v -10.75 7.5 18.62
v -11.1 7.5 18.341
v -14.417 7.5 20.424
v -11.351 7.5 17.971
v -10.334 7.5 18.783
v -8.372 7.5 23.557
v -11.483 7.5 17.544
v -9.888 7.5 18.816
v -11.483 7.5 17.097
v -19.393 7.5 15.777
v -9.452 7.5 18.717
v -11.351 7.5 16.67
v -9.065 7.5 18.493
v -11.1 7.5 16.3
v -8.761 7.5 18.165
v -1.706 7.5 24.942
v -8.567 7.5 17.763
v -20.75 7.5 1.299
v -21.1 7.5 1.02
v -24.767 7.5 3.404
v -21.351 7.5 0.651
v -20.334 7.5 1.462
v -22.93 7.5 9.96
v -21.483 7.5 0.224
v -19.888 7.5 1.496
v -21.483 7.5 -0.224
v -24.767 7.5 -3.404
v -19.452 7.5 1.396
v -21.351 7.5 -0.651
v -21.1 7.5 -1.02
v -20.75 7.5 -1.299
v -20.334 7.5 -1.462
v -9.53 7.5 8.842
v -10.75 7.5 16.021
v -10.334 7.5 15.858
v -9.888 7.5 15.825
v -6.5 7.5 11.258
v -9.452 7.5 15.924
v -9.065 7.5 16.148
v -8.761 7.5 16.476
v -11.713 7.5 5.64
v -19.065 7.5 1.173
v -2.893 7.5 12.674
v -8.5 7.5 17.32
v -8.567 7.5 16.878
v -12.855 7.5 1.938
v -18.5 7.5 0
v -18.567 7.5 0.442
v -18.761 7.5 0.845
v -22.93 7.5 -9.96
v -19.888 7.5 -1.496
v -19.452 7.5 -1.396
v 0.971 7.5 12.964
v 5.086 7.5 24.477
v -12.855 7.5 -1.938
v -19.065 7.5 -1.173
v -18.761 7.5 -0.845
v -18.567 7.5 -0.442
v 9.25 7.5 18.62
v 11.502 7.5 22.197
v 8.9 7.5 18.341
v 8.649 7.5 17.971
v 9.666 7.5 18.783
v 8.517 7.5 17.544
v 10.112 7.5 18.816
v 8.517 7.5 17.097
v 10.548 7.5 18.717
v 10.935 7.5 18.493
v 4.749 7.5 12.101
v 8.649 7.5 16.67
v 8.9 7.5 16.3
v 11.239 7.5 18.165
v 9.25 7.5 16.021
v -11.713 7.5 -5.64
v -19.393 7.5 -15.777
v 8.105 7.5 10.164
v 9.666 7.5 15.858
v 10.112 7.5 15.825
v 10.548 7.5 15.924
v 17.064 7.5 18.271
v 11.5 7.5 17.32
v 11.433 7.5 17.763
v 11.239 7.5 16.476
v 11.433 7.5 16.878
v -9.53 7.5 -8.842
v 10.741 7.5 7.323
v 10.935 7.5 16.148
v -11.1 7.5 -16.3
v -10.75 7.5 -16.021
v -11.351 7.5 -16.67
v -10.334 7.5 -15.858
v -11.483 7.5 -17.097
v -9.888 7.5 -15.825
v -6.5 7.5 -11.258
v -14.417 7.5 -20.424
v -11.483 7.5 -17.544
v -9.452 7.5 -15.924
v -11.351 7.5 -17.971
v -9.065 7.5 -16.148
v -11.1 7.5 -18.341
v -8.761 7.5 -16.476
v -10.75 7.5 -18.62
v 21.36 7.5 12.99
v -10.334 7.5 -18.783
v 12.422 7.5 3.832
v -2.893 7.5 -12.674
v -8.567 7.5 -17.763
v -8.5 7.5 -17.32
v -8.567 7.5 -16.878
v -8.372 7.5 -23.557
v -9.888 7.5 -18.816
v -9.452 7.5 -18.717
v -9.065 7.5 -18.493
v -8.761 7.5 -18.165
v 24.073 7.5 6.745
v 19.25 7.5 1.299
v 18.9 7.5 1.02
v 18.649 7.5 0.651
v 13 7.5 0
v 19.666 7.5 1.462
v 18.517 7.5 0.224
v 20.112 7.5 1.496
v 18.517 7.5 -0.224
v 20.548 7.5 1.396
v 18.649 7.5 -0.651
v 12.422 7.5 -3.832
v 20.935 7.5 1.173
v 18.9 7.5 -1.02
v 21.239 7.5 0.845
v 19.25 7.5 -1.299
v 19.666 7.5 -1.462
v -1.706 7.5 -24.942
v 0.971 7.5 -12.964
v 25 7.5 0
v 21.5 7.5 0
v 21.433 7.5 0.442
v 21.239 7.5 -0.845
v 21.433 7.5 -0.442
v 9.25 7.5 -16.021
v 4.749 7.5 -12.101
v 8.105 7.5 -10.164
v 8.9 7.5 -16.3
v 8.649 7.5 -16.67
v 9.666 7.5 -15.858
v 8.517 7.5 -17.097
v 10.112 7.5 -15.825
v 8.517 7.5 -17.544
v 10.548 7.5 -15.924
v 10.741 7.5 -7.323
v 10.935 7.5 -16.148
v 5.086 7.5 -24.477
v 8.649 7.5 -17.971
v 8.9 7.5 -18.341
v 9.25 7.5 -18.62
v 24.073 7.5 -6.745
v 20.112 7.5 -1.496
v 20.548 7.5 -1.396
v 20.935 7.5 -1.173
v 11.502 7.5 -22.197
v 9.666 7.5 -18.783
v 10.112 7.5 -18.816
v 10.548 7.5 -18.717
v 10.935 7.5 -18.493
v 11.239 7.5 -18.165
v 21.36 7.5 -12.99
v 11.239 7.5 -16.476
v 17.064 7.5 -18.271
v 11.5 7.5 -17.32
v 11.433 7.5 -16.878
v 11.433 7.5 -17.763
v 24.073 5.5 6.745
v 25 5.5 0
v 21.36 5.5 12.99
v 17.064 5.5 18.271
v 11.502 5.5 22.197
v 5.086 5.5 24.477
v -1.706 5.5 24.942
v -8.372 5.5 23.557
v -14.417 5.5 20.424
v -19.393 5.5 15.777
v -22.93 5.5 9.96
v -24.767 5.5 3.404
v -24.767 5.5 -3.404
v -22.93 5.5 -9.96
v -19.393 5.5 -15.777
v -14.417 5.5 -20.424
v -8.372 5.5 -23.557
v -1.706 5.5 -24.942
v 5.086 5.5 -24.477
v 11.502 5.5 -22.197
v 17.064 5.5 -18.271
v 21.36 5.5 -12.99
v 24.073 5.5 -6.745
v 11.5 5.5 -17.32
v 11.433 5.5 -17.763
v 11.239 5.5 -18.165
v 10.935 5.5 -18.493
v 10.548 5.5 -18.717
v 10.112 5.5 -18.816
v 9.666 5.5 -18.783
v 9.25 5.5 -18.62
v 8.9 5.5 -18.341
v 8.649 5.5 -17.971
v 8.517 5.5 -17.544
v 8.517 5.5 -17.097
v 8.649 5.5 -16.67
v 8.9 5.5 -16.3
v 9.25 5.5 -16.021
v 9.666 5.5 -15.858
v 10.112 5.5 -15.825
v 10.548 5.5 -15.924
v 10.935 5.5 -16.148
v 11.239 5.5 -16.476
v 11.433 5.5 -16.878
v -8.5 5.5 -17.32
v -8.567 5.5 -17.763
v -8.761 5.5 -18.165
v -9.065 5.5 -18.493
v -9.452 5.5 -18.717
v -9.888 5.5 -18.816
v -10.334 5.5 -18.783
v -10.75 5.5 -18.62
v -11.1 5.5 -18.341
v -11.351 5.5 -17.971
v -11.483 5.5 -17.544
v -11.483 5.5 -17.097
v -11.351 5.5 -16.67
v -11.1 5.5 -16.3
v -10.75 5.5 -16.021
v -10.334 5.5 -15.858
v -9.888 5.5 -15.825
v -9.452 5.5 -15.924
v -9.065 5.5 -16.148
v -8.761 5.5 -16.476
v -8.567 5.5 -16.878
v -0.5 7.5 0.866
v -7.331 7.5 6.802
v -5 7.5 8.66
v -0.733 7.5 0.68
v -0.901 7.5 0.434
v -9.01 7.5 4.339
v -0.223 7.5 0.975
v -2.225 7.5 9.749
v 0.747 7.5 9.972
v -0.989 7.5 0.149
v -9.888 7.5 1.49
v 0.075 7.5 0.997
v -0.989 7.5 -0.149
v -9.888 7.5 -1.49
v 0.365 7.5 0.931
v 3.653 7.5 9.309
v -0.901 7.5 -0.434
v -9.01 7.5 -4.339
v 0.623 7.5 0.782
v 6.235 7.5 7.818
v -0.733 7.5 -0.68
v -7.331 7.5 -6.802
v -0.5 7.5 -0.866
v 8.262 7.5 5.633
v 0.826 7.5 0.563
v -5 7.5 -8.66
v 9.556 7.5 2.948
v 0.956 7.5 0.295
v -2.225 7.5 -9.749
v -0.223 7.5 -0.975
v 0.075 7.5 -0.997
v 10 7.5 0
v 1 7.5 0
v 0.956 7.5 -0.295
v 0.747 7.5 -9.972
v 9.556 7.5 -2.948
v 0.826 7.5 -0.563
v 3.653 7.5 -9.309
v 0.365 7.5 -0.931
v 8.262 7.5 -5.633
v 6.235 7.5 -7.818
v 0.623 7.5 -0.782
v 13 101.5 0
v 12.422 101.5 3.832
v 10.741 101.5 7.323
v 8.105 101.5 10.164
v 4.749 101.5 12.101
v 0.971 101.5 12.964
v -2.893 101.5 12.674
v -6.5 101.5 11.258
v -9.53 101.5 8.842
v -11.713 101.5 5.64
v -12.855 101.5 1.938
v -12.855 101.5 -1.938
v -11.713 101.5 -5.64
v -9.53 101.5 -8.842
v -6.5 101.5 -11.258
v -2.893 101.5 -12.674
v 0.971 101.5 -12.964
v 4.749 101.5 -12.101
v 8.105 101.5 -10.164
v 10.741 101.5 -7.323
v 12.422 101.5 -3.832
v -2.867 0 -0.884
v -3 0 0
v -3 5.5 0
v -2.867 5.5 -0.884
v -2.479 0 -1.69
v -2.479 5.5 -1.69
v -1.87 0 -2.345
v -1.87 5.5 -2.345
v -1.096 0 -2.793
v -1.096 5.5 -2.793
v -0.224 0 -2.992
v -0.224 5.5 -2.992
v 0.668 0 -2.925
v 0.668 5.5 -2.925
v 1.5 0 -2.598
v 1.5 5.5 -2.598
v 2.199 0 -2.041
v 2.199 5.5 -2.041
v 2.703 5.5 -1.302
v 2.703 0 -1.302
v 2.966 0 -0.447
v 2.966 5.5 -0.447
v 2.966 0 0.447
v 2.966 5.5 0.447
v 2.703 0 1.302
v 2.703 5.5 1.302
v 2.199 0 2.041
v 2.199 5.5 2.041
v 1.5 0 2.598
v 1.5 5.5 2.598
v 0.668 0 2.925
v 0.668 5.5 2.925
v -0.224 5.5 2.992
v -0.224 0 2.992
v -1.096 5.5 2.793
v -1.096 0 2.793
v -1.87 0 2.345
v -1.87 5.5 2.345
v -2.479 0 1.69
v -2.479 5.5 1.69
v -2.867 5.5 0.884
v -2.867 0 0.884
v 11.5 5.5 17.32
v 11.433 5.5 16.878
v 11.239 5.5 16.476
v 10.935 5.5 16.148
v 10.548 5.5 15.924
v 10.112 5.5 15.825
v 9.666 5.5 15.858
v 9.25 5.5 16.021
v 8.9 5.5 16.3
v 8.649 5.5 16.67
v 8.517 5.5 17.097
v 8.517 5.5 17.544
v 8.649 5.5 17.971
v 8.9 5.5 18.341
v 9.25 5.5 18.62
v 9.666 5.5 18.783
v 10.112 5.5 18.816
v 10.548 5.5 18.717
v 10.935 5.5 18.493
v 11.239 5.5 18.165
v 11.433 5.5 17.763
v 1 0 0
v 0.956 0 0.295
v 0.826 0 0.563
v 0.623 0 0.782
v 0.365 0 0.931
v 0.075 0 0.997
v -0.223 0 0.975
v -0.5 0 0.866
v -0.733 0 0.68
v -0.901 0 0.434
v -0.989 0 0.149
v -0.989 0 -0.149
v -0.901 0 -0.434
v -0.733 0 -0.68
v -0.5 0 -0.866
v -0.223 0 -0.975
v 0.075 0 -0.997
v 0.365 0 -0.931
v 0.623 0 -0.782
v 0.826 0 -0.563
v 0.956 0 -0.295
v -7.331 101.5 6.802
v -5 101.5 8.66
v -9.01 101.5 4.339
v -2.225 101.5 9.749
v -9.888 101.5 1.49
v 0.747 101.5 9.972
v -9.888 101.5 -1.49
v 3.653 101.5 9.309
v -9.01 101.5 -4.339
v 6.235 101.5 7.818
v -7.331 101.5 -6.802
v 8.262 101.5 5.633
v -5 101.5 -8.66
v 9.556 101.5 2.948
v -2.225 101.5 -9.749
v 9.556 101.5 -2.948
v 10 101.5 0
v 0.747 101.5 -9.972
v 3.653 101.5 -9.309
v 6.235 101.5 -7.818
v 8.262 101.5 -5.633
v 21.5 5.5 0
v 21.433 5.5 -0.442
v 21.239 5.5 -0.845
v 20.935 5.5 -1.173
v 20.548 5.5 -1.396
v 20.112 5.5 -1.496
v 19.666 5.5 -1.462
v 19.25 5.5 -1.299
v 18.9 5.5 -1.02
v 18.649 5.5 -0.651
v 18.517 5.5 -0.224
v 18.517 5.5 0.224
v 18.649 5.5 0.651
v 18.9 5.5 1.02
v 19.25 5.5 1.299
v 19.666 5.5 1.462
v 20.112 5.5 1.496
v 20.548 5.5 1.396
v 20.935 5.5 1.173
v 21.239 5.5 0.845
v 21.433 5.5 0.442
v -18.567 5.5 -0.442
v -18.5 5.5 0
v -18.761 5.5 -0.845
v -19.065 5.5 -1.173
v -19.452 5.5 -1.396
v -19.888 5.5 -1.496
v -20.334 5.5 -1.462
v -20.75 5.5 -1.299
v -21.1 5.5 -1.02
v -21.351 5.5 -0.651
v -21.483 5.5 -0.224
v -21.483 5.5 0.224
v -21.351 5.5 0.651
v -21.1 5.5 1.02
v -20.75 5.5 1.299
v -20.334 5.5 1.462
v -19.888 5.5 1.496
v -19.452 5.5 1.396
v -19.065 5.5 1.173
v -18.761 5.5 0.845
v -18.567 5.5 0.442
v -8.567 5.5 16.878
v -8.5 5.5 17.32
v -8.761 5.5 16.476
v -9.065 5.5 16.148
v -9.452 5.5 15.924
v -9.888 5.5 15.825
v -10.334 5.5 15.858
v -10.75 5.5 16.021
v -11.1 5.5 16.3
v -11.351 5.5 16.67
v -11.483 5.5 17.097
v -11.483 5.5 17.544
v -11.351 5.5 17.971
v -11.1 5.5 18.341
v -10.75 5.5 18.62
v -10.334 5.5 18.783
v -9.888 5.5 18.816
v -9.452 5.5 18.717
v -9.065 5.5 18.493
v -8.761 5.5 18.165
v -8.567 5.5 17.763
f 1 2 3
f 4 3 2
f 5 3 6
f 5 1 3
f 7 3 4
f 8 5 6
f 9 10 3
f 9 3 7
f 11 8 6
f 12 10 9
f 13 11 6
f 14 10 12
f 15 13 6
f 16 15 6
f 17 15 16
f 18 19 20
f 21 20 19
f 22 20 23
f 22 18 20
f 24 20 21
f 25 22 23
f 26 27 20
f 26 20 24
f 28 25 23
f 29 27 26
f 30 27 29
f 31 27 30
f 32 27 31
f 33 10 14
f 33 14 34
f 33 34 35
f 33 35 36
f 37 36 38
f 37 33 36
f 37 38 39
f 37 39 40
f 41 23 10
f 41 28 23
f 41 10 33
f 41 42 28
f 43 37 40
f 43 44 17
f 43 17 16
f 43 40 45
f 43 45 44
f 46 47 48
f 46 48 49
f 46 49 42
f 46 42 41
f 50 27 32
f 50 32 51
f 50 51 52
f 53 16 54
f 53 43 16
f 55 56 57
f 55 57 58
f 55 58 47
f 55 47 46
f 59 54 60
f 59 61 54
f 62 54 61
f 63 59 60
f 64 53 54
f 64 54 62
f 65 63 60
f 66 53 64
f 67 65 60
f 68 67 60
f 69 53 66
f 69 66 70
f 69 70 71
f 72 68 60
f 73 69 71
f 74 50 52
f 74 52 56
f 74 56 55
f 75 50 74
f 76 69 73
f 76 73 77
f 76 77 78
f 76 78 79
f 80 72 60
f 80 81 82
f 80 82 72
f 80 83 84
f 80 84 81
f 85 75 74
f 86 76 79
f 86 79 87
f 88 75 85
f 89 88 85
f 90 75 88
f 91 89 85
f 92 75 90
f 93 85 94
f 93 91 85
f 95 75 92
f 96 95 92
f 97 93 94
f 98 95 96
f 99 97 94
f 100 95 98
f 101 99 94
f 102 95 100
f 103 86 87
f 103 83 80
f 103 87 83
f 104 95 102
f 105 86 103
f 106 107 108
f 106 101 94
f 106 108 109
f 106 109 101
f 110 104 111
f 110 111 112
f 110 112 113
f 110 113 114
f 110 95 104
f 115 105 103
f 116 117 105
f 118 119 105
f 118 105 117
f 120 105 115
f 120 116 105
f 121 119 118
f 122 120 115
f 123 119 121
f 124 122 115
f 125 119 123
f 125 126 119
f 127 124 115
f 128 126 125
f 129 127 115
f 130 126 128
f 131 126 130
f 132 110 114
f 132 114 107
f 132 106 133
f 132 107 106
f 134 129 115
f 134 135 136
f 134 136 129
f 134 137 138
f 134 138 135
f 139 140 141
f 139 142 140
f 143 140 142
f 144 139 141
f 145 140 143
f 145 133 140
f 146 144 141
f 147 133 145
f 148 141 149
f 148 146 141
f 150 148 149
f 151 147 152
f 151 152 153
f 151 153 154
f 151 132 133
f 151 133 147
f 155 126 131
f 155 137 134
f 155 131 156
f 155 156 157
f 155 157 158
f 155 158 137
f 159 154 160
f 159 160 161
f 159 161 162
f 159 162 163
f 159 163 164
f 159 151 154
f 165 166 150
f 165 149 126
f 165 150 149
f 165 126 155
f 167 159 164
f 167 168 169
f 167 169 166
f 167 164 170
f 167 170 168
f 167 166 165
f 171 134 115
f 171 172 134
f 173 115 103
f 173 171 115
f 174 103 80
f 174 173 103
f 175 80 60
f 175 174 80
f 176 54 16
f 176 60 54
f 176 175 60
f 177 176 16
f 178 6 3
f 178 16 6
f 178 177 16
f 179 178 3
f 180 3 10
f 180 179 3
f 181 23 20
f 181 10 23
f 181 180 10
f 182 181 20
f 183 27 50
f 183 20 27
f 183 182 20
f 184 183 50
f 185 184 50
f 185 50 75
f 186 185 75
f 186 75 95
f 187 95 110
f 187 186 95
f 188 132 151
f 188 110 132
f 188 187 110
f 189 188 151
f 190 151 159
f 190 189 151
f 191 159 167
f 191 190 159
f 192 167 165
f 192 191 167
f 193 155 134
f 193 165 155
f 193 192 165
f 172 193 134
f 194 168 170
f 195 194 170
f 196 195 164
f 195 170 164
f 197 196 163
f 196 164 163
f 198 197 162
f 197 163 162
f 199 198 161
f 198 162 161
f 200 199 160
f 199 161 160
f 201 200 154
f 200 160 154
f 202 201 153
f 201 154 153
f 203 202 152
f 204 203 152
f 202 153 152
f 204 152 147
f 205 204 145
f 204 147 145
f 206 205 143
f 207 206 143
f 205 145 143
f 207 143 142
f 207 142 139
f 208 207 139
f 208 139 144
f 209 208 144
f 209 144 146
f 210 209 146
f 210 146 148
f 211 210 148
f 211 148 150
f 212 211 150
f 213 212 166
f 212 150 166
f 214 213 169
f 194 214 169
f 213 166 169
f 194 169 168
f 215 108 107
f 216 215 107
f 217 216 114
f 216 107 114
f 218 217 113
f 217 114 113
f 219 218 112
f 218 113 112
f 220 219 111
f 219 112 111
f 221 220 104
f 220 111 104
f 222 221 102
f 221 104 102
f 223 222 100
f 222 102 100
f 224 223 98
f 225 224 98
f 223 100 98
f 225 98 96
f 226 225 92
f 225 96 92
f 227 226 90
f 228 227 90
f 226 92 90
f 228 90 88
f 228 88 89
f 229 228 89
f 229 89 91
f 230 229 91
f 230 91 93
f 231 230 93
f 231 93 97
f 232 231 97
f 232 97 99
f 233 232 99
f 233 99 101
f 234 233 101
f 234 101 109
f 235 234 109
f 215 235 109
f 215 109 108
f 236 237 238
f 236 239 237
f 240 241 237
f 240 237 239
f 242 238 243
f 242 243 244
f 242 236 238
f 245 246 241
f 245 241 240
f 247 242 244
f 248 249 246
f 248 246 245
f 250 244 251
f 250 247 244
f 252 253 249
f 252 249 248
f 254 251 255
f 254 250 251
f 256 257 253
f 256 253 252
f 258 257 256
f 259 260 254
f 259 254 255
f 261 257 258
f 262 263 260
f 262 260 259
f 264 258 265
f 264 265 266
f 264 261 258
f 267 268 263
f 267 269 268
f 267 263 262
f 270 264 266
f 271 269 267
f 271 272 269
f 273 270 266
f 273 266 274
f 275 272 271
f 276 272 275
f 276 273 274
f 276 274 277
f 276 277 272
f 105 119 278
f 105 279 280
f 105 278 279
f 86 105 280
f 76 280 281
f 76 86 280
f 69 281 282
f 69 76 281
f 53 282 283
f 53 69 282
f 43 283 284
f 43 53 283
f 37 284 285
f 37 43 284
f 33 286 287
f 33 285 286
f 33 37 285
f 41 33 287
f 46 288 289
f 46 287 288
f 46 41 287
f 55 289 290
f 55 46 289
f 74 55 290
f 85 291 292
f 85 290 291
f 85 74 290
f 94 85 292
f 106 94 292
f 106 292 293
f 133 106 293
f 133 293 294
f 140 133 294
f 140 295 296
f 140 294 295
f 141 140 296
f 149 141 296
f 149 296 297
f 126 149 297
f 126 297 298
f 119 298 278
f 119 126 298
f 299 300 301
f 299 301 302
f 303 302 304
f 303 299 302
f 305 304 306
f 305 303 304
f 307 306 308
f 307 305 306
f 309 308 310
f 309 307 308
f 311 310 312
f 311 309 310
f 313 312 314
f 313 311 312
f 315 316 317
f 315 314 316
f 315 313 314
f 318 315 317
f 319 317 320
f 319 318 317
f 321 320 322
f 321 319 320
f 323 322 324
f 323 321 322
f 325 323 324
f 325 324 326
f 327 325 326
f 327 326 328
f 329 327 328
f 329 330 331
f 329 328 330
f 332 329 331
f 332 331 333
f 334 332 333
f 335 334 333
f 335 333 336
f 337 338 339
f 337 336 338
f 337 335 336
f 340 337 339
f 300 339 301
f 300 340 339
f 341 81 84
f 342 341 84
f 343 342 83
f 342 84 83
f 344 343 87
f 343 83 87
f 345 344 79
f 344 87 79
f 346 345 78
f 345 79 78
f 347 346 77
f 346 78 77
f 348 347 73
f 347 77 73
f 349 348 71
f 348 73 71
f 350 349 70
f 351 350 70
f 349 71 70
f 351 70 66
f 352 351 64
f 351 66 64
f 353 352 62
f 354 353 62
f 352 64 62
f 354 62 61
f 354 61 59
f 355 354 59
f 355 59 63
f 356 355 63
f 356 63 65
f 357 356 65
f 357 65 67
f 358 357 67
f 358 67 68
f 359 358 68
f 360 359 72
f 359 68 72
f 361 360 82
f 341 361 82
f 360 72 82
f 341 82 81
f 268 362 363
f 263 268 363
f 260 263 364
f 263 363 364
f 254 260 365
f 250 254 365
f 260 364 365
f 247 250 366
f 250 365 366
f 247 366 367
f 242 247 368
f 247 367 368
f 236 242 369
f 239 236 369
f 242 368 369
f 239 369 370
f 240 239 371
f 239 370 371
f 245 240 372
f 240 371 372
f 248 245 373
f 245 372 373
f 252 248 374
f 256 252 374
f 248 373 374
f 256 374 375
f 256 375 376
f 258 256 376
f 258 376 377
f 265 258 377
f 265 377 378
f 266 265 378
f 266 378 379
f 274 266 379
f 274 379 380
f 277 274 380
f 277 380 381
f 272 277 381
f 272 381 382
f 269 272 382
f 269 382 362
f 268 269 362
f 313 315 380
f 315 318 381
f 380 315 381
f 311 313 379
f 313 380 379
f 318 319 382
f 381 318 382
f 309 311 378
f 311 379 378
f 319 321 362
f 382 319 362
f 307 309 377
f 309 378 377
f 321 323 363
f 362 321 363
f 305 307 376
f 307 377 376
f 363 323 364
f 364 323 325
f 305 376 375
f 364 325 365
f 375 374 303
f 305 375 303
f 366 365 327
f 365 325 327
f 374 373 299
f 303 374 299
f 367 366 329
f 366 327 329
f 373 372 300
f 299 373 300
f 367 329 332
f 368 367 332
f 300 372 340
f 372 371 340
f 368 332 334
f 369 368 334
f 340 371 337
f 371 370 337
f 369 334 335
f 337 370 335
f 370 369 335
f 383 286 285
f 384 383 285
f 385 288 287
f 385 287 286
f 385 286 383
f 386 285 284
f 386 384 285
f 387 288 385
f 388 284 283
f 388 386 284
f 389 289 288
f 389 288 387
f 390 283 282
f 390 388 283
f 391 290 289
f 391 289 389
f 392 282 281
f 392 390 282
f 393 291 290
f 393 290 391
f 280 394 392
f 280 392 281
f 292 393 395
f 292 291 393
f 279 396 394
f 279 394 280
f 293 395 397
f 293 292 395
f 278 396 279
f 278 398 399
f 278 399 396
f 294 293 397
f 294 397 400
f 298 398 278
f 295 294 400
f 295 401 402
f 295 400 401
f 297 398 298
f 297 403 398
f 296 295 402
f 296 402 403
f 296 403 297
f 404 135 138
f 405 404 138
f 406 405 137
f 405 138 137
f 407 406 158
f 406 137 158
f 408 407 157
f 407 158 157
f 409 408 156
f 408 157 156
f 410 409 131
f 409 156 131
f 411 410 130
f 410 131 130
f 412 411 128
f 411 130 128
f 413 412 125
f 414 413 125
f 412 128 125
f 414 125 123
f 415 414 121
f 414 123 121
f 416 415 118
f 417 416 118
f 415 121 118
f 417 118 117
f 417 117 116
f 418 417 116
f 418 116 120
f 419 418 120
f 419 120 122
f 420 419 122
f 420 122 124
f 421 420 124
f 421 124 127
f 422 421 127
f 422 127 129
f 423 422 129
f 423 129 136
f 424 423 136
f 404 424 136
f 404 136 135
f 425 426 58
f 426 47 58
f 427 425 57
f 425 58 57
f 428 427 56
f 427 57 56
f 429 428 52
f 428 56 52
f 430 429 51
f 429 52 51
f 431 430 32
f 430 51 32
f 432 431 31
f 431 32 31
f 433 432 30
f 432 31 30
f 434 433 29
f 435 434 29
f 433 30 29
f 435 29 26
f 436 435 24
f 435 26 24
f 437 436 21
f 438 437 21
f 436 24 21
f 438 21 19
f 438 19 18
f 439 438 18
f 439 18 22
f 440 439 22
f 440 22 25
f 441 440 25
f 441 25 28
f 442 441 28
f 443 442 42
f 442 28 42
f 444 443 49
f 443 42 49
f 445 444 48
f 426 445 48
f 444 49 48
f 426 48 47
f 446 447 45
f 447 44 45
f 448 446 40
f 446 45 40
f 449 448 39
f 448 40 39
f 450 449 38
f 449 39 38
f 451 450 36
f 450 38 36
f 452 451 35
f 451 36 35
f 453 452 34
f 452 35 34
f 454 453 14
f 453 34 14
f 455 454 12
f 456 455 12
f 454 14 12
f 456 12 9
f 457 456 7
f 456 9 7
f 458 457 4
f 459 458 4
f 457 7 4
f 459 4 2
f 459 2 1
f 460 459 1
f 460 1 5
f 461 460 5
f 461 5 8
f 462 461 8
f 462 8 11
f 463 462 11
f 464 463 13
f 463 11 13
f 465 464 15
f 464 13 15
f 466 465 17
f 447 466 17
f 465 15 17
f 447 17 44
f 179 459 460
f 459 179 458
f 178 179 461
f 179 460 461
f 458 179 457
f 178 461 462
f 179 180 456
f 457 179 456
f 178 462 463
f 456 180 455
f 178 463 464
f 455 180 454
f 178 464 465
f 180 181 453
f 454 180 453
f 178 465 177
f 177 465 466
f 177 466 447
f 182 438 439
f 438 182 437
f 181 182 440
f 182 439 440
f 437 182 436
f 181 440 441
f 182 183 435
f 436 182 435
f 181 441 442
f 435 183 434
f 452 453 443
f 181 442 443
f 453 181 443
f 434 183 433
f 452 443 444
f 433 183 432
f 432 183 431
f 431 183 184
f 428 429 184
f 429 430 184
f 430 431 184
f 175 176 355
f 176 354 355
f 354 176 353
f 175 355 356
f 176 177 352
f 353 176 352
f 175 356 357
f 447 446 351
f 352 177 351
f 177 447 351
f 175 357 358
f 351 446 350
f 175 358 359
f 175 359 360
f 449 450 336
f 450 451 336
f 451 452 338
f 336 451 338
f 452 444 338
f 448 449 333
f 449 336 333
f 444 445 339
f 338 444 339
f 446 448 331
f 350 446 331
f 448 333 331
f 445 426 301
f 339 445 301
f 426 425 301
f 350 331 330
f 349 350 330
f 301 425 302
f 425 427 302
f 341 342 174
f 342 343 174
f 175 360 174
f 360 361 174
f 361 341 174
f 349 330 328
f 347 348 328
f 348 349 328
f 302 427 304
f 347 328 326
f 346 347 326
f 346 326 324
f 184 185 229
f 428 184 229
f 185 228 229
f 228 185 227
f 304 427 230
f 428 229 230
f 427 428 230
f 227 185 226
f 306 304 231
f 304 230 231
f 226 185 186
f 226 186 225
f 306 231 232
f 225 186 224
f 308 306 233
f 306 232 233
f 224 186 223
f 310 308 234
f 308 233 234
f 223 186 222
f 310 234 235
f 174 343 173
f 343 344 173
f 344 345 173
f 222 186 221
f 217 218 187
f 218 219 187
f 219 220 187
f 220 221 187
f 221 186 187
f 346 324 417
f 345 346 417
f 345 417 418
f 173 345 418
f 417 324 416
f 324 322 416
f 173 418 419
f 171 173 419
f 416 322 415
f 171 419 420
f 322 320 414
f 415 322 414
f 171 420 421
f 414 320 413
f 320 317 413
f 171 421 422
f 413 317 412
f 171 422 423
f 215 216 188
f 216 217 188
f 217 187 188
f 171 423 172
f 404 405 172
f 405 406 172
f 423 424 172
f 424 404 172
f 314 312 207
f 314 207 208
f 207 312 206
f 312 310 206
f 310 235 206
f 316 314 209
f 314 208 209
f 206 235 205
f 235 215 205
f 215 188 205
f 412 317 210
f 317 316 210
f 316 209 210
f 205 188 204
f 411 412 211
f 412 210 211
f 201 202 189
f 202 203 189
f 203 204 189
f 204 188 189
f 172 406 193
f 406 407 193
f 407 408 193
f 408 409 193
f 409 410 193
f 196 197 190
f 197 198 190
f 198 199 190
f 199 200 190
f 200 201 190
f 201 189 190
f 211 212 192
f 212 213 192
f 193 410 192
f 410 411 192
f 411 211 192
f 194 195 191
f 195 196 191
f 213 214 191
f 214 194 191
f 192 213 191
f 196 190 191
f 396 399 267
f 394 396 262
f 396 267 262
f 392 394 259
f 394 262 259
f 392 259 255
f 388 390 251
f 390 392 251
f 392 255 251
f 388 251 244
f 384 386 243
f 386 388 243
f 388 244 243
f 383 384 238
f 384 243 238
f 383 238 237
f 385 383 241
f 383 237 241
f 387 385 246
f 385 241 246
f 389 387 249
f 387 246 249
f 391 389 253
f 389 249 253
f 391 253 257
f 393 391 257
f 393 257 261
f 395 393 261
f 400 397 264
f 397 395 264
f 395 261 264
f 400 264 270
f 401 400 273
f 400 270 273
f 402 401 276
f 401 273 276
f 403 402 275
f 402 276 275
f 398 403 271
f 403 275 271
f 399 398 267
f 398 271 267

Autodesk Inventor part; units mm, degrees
ref_plane "YZ Plane" through (0, 0, 0) normal (1, 0, 0) x (0, 1, 0)
ref_plane "XZ Plane" through (0, 0, 0) normal (0, 1, 0) x (-1, 0, 0)
ref_plane "XY Plane" through (0, 0, 0) normal (0, 0, 1) x (1, 0, 0)
sketch "Sketch1" plane through (0, 0, 0) normal (0, 1, 0) x (-1, 0, 0)
  circle A0 centre (0, 0) radius 3
  dimension "d0" = 6
extrude "Extrusion1" add sketch "Sketch1" along normal blind 5.5
sketch "Sketch2" plane through (0, 5.5, 0) normal (0, 1, 0) x (1, 0, 0)
  circle A0 centre (0, 0) radius 25
  dimension "d3" = 50
extrude "Extrusion2" add sketch "Sketch2" along normal blind 2
sketch "Sketch3" plane through (0, 7.5, 0) normal (0, 1, 0) x (1, 0, 0)
  circle A0 centre (0, 0) radius 13
  circle A1 centre (0, 0) radius 10
  dimension "d6" = 20
  dimension "d24" = 26
extrude "Extrusion3" add sketch "Sketch3" along normal blind 94
sketch "Sketch4" plane through (0, 0, 0) normal (0, -1, 0) x (1, 0, 0)
  circle A0 centre (0, 0) radius 1
  dimension "d9" = 2
extrude "Extrusion4" cut sketch "Sketch4" against normal through all
thread "Thread2" size "M6x1" class "6g" standard "ANSI Metric M Profile" full length
sketch "Sketch5" plane through (0, 7.5, 0) normal (0, 1, 0) x (1, 0, 0)
  circle A0 centre (0, 0) radius 1 projected
  circle A1 centre (0, 0) radius 20
  circle A2 centre (-20, 0) radius 1.5
  circle A3 centre (-10, -17.3205) radius 1.5
  circle A4 centre (10, -17.3205) radius 1.5
  circle A5 centre (20, 0) radius 1.5
  circle A6 centre (10, 17.3205) radius 1.5
  circle A7 centre (-10, 17.3205) radius 1.5
  dimension "d16" = 40
  dimension "d17" = 3
  dimension "d20" = 360
extrude "Extrusion5" cut sketch "Sketch5" against normal through all contours A1 A5 | A1 A5 | A6 A1 | A1 A6 | A4 A1 | A1 A4 | A7 A1 | A1 A7 | A3 A1 | A1 A3 | A2 A1 | A1 A2
properties part number "CylinderAttachment"
